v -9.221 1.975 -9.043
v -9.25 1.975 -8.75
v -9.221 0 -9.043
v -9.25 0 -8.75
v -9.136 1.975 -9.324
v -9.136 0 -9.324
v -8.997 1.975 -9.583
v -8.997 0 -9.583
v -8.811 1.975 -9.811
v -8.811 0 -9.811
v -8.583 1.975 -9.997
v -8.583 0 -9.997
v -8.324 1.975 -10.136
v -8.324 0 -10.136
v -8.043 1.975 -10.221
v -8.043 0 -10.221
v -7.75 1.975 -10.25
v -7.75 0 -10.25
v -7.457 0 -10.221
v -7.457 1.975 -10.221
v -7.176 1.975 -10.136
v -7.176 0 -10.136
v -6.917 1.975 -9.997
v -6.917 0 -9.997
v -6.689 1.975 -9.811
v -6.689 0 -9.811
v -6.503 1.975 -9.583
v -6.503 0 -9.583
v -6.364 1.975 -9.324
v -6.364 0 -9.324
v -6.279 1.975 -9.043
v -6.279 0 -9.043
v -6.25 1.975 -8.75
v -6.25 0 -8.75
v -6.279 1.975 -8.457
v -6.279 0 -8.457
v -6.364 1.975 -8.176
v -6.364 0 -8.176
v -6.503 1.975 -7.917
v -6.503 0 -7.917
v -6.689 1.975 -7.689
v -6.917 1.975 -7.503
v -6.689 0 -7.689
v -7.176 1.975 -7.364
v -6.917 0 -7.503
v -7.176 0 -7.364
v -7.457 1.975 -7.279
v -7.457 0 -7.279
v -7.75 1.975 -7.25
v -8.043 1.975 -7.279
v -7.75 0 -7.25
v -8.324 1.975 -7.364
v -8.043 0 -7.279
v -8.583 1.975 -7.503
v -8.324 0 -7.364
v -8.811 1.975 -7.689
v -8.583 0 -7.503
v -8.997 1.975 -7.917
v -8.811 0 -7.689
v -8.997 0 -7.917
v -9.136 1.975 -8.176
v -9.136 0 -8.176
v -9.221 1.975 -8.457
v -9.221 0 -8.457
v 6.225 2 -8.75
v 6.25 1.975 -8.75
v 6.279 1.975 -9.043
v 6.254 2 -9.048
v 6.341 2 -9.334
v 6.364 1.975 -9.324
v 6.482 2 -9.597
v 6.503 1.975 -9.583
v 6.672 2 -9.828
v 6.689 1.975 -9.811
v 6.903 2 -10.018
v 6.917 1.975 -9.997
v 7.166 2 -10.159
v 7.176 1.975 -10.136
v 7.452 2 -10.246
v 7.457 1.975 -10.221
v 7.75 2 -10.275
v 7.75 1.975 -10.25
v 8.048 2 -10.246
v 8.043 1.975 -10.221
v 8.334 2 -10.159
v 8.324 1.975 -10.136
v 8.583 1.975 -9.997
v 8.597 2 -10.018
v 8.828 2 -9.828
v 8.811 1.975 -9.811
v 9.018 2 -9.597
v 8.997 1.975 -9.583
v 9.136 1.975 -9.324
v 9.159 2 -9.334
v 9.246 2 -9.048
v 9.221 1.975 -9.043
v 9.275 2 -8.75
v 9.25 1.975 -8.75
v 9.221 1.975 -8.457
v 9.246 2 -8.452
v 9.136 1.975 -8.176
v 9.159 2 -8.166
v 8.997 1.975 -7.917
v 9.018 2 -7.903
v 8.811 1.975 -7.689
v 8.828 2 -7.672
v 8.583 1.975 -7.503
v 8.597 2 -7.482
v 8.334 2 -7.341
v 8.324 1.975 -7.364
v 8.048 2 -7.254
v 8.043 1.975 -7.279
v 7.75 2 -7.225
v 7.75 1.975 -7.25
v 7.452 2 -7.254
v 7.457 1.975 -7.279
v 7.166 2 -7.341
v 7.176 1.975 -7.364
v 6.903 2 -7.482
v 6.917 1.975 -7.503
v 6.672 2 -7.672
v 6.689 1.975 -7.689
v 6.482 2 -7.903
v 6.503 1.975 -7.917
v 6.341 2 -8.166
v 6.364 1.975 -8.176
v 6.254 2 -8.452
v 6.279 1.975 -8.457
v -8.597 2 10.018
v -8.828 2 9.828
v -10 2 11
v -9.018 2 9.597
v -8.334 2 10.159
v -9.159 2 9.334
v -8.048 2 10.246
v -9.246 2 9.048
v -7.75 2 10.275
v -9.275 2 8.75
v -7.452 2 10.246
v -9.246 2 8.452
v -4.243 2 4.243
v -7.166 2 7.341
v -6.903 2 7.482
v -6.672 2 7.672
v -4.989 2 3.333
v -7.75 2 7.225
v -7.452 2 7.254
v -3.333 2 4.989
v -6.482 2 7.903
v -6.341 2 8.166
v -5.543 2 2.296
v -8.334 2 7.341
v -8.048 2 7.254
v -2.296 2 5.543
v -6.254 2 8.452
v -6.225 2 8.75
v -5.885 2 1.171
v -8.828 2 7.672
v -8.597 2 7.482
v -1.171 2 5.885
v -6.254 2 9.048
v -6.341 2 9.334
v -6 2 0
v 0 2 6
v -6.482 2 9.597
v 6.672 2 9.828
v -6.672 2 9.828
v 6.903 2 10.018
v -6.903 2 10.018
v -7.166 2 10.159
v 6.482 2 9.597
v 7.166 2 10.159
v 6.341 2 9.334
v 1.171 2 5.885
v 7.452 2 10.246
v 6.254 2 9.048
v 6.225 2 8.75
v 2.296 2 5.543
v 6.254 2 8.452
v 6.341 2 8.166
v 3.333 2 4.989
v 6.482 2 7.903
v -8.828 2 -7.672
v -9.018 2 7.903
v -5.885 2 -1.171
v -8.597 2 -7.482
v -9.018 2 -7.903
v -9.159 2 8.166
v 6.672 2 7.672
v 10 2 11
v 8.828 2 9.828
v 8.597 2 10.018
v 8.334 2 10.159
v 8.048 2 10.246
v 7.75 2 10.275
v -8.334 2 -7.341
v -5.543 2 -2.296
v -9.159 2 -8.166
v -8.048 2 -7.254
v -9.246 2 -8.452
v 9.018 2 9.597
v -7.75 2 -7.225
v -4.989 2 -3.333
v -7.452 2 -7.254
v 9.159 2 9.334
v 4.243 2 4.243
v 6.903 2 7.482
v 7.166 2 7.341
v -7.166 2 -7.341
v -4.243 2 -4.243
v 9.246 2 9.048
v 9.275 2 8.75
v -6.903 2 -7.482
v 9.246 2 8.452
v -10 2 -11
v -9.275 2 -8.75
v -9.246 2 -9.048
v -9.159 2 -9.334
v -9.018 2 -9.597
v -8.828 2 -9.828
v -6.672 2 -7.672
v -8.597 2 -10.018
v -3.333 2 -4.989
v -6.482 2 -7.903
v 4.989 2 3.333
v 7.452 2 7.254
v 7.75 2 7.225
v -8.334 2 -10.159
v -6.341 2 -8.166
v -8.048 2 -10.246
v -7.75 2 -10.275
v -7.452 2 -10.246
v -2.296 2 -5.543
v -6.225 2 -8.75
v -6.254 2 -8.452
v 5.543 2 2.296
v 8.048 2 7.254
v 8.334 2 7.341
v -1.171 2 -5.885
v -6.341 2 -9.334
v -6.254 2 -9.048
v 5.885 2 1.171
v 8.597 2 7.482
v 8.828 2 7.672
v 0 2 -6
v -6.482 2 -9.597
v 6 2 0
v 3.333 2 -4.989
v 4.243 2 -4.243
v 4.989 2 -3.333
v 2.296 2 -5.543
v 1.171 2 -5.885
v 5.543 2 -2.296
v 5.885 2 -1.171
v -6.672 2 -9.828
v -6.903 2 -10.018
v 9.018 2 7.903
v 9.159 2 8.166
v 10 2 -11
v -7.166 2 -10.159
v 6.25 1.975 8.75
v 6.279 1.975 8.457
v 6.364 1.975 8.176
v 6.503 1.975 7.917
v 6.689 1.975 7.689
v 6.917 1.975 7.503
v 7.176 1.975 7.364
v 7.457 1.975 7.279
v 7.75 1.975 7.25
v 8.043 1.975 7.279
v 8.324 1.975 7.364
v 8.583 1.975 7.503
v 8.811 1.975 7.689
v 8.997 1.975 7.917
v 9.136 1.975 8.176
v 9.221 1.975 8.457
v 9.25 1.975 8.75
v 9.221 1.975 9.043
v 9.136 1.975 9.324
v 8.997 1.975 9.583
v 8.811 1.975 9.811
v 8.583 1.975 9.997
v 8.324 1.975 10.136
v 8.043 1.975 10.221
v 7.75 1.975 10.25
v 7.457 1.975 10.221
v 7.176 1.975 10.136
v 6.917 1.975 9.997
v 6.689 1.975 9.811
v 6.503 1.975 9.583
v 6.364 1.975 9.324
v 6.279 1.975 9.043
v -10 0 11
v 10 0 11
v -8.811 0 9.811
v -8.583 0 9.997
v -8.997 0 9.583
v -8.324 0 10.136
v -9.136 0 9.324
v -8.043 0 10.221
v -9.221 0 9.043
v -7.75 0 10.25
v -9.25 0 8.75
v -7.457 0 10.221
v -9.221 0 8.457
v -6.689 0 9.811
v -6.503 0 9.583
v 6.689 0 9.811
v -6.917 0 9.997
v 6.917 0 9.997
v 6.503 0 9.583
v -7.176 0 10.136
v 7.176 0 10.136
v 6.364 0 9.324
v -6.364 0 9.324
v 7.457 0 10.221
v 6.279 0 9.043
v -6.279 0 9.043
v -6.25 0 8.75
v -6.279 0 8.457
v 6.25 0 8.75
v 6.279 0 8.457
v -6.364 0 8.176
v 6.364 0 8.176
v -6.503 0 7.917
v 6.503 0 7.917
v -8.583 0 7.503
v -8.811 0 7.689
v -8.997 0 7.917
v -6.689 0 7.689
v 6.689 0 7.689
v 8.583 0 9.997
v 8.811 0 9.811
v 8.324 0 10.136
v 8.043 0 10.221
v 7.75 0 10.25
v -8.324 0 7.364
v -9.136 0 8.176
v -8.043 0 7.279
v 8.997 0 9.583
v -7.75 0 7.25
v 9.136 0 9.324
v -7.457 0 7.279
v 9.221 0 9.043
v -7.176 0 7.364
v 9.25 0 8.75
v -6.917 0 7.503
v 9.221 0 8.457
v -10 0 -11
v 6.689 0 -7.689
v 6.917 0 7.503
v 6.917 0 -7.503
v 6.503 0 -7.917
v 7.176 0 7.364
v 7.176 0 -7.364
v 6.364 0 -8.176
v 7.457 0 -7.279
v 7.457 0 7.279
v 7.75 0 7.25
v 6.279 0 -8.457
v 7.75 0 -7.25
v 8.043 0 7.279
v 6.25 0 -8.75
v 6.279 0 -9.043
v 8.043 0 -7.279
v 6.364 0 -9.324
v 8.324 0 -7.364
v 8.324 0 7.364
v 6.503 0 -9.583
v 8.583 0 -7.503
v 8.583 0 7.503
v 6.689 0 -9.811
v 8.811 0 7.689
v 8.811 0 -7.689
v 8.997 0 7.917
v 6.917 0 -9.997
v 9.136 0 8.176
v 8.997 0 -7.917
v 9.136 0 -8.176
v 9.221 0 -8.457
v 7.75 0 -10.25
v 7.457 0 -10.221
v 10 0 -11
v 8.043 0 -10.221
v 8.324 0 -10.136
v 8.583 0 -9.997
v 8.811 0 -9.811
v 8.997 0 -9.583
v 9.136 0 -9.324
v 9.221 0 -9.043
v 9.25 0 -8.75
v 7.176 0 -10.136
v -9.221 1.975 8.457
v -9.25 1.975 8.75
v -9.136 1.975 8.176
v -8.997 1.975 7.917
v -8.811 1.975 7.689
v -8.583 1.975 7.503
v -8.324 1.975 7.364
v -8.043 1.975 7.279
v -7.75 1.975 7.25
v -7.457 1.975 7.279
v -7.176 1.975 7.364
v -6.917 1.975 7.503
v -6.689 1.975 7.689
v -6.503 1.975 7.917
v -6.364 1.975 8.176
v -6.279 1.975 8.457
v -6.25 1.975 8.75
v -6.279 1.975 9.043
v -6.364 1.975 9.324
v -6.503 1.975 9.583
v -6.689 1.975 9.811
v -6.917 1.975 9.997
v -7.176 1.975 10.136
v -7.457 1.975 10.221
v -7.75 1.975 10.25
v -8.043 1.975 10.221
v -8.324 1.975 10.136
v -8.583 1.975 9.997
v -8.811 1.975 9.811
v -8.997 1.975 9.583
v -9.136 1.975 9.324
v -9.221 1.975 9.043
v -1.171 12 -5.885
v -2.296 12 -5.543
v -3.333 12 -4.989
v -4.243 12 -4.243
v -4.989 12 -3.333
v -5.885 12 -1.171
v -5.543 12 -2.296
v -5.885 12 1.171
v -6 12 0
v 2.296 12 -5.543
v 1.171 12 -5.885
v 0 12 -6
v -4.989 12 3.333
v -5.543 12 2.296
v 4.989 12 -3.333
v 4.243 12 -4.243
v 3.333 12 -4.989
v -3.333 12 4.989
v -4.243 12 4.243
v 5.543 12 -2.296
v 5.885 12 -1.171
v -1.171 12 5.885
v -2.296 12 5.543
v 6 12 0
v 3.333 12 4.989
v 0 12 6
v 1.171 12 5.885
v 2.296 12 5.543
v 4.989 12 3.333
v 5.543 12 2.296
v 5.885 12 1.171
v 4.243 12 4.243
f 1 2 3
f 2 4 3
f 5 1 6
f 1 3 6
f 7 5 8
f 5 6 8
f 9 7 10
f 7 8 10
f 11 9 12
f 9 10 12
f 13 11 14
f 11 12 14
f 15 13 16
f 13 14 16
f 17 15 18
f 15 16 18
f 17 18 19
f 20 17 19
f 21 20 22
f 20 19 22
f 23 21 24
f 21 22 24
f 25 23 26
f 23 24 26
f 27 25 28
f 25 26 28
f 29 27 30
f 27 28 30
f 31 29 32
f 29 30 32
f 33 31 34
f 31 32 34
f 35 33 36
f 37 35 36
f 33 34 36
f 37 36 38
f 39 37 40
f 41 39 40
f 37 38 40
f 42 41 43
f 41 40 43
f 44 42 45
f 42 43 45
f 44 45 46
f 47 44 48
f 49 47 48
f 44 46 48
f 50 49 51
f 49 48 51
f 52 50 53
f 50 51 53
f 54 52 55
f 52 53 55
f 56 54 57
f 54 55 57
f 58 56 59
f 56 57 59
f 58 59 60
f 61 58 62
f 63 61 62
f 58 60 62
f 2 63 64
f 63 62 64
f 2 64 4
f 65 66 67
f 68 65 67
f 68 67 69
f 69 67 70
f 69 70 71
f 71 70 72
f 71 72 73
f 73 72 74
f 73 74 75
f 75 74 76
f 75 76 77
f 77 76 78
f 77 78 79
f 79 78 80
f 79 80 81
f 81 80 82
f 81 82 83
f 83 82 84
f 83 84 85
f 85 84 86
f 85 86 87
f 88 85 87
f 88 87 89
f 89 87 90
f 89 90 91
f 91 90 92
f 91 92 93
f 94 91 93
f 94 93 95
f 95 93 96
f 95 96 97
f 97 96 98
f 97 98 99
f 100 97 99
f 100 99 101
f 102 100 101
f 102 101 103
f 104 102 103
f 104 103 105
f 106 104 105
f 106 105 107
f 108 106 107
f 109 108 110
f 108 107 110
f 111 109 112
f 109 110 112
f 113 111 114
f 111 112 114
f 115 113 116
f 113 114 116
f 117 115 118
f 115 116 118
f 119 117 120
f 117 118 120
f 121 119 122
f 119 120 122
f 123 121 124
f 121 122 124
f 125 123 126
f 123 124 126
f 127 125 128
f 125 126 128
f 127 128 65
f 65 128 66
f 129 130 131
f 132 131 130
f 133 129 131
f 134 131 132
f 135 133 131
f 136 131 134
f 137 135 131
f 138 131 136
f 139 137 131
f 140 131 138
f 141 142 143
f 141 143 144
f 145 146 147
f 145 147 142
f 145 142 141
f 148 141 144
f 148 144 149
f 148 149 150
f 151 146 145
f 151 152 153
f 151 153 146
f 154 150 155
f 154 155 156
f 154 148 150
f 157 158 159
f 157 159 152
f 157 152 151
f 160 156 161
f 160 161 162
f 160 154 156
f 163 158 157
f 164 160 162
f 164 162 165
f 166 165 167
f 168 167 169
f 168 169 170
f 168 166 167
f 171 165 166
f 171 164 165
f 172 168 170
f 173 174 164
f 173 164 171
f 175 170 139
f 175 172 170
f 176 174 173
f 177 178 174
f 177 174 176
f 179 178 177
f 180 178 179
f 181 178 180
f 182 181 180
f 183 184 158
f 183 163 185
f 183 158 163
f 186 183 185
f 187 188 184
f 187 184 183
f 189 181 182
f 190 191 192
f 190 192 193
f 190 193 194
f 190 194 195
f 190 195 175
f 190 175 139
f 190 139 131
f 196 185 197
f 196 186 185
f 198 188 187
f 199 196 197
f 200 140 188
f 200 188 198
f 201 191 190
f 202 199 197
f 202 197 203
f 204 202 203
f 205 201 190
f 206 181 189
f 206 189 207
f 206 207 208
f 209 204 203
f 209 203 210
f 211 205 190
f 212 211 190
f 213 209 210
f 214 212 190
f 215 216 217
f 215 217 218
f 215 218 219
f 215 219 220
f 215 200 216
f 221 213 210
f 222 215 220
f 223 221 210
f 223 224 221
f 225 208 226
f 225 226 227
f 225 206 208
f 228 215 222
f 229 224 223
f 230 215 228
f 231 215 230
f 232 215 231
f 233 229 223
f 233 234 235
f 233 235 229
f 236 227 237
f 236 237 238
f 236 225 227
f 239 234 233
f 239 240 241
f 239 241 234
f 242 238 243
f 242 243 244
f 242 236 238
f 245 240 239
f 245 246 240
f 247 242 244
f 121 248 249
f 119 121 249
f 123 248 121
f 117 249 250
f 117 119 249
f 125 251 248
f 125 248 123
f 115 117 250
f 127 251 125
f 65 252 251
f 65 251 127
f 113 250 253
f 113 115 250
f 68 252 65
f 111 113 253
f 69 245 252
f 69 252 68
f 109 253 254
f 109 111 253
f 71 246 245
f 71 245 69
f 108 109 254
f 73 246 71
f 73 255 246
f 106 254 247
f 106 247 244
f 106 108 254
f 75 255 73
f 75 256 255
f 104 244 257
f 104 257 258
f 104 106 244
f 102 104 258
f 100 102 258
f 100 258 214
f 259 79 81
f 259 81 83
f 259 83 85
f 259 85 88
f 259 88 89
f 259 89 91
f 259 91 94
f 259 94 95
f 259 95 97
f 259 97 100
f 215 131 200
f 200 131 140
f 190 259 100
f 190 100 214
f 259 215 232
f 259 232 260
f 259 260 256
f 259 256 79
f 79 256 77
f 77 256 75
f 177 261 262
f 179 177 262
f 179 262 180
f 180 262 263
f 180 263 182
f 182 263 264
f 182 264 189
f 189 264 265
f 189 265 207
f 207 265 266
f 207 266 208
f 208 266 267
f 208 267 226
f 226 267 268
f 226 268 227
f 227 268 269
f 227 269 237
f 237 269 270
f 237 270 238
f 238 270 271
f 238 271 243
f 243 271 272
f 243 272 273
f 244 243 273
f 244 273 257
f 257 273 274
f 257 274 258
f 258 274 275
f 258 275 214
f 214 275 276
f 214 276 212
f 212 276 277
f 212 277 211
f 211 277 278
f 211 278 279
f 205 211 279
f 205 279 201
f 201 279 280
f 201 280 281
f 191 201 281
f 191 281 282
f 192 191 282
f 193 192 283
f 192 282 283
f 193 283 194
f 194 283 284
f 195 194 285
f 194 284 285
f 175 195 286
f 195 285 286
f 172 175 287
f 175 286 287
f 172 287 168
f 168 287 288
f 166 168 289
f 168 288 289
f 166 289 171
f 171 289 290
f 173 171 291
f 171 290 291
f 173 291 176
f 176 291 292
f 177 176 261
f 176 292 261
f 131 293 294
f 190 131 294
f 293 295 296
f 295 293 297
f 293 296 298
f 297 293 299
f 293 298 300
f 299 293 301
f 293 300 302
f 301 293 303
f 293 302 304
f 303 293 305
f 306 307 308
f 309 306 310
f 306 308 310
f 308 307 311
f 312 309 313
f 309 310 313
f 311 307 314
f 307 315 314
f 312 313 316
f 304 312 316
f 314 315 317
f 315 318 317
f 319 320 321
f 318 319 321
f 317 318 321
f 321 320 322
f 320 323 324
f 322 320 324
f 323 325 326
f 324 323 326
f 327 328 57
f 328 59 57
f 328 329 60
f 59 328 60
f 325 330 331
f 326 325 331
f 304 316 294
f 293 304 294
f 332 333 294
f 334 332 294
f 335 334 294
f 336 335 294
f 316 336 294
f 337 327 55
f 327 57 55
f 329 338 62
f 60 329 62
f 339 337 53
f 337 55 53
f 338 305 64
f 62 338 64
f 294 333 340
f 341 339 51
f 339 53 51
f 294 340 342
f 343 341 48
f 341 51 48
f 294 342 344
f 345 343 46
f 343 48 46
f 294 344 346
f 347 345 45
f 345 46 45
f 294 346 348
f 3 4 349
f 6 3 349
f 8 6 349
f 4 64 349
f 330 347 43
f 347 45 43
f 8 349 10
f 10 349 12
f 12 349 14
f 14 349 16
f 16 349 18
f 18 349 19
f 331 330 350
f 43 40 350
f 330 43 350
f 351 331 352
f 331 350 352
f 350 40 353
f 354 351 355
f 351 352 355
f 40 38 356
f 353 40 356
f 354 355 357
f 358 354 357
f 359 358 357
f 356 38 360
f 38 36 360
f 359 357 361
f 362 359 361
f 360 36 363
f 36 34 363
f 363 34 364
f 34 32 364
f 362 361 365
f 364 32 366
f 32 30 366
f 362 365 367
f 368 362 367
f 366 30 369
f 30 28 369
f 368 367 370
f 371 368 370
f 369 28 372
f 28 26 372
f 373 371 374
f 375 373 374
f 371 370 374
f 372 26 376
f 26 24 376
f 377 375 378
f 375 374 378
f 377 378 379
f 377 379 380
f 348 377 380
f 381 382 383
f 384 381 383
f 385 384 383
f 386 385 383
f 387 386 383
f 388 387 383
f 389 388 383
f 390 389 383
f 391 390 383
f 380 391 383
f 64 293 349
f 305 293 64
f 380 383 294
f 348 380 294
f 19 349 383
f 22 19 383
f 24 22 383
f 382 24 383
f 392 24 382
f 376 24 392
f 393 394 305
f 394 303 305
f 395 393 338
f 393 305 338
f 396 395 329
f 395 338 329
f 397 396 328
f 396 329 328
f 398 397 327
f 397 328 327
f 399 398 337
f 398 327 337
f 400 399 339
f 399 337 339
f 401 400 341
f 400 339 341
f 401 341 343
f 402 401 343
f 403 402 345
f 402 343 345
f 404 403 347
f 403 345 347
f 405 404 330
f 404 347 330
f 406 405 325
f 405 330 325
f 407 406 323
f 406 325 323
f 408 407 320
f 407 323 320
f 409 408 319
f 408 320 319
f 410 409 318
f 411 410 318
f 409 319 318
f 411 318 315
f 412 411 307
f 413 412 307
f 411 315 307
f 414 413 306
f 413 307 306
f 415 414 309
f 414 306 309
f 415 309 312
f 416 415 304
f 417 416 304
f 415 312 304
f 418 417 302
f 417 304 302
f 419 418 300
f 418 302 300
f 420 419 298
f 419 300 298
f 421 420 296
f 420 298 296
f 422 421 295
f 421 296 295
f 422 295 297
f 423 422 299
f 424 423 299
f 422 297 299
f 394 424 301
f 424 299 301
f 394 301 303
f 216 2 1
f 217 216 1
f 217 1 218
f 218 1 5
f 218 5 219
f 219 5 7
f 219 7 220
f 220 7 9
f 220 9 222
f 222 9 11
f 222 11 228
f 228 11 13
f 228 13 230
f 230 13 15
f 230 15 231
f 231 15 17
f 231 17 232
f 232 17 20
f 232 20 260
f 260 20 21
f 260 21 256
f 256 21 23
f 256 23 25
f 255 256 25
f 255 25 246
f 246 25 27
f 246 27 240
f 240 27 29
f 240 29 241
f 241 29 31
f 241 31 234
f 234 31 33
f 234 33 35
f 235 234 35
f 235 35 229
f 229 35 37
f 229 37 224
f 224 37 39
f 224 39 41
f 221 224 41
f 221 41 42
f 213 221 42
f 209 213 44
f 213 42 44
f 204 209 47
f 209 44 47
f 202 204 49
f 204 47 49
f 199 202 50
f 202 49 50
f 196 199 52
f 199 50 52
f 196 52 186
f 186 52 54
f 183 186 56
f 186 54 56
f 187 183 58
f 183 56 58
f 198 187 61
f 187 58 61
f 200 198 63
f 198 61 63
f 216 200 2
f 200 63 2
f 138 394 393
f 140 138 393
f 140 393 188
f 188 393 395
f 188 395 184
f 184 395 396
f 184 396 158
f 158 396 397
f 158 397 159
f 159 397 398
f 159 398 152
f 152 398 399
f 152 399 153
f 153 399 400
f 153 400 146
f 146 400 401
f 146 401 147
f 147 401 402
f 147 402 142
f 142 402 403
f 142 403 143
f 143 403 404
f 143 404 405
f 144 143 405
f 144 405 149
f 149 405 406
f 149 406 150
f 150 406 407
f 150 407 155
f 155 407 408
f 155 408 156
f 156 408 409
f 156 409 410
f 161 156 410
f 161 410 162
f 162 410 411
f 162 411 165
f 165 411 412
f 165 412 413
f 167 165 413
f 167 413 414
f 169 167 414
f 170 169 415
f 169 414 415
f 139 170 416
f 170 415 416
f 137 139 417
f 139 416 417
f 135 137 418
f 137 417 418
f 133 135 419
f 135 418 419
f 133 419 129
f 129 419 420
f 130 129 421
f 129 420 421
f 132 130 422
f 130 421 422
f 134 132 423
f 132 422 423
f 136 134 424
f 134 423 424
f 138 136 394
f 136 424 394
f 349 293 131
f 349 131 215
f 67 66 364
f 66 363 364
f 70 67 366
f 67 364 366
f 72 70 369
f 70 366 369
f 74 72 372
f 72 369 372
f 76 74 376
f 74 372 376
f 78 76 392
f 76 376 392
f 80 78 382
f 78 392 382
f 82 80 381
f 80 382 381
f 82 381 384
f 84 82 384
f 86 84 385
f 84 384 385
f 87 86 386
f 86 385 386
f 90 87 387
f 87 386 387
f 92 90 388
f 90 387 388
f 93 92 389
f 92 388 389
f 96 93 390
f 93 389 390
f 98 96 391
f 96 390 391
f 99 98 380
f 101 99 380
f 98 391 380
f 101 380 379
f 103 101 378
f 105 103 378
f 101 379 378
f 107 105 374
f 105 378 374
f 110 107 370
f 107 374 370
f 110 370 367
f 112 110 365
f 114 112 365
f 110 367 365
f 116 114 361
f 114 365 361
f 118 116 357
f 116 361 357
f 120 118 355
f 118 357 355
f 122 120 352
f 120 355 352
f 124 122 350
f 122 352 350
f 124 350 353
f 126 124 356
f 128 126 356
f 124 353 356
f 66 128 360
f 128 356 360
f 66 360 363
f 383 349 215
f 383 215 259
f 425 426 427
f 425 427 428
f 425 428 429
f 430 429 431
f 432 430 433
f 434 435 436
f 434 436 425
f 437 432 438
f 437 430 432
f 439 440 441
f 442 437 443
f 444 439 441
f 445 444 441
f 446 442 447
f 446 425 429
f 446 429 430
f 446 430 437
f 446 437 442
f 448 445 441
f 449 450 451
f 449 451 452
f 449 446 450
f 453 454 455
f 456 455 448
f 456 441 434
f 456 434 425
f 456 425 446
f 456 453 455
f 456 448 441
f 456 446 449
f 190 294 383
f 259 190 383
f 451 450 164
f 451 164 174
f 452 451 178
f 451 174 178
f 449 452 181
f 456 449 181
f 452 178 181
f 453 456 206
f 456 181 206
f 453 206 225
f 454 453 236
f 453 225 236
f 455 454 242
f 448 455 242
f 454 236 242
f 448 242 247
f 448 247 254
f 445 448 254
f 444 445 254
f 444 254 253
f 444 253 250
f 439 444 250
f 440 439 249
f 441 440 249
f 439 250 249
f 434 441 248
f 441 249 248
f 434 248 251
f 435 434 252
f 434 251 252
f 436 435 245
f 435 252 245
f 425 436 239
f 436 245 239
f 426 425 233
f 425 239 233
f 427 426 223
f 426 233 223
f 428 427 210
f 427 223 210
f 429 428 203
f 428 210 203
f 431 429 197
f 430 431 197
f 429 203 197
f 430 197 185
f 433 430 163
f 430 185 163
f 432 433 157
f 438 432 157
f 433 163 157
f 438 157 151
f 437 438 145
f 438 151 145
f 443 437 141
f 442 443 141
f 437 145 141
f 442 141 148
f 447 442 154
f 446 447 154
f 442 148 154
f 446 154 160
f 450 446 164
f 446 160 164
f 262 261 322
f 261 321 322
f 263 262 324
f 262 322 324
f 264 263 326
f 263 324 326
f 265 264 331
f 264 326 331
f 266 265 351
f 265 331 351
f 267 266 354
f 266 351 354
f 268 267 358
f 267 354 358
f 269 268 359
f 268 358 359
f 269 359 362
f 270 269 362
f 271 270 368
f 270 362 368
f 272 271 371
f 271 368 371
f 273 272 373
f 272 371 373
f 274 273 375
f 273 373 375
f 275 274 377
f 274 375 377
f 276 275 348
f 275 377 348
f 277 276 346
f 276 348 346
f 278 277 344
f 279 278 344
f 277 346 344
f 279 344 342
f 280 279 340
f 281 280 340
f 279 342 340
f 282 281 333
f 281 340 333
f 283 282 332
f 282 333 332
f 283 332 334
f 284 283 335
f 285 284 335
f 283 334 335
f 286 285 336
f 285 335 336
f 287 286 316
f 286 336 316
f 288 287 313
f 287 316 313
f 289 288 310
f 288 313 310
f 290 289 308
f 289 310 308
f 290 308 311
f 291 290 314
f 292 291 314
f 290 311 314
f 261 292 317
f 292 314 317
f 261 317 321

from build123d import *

# Parameters (mm, degrees)
SKETCH1_W                          = 20
SKETCH1_H                          = 22
BOSS_EXTRUDE1_DEPTH                = 2
F_3_0_3_DIAMETER_HOLE1_D           = 3
F_3_0_3_DIAMETER_HOLE1_CSINK_D     = 3.05
F_3_0_3_DIAMETER_HOLE1_CSINK_ANGLE = 90
SKETCH4_R                          = 6
BOSS_EXTRUDE2_DEPTH                = 10


with BuildPart() as part:
    # Sketch1 → Boss-Extrude1 (new body)
    with BuildSketch(Plane(origin=(0, 0, 0), x_dir=(1, 0, 0), z_dir=(0, 1, 0))):
        Rectangle(SKETCH1_W, SKETCH1_H)
    extrude(amount=BOSS_EXTRUDE1_DEPTH)

    # Ø3.0 (3) Diameter Hole1 (through all)
    with Locations(Plane(origin=(0, 2, 0), x_dir=(1, 0, 0), z_dir=(0, 1, 0))):
        with Locations((-7.75, 8.75), (7.75, -8.75), (-7.75, -8.75), (7.75, 8.75)):
            CounterSinkHole(F_3_0_3_DIAMETER_HOLE1_D / 2, F_3_0_3_DIAMETER_HOLE1_CSINK_D / 2, counter_sink_angle=F_3_0_3_DIAMETER_HOLE1_CSINK_ANGLE)

    # Sketch4 → Boss-Extrude2 (add)
    with BuildSketch(Plane(origin=(0, 2, 0), x_dir=(1, 0, 0), z_dir=(0, 1, 0))):
        with Locations(Location((0, 0, 0), (0, 0, 270))):
            Circle(SKETCH4_R)
    extrude(amount=BOSS_EXTRUDE2_DEPTH)


solid = part.part
